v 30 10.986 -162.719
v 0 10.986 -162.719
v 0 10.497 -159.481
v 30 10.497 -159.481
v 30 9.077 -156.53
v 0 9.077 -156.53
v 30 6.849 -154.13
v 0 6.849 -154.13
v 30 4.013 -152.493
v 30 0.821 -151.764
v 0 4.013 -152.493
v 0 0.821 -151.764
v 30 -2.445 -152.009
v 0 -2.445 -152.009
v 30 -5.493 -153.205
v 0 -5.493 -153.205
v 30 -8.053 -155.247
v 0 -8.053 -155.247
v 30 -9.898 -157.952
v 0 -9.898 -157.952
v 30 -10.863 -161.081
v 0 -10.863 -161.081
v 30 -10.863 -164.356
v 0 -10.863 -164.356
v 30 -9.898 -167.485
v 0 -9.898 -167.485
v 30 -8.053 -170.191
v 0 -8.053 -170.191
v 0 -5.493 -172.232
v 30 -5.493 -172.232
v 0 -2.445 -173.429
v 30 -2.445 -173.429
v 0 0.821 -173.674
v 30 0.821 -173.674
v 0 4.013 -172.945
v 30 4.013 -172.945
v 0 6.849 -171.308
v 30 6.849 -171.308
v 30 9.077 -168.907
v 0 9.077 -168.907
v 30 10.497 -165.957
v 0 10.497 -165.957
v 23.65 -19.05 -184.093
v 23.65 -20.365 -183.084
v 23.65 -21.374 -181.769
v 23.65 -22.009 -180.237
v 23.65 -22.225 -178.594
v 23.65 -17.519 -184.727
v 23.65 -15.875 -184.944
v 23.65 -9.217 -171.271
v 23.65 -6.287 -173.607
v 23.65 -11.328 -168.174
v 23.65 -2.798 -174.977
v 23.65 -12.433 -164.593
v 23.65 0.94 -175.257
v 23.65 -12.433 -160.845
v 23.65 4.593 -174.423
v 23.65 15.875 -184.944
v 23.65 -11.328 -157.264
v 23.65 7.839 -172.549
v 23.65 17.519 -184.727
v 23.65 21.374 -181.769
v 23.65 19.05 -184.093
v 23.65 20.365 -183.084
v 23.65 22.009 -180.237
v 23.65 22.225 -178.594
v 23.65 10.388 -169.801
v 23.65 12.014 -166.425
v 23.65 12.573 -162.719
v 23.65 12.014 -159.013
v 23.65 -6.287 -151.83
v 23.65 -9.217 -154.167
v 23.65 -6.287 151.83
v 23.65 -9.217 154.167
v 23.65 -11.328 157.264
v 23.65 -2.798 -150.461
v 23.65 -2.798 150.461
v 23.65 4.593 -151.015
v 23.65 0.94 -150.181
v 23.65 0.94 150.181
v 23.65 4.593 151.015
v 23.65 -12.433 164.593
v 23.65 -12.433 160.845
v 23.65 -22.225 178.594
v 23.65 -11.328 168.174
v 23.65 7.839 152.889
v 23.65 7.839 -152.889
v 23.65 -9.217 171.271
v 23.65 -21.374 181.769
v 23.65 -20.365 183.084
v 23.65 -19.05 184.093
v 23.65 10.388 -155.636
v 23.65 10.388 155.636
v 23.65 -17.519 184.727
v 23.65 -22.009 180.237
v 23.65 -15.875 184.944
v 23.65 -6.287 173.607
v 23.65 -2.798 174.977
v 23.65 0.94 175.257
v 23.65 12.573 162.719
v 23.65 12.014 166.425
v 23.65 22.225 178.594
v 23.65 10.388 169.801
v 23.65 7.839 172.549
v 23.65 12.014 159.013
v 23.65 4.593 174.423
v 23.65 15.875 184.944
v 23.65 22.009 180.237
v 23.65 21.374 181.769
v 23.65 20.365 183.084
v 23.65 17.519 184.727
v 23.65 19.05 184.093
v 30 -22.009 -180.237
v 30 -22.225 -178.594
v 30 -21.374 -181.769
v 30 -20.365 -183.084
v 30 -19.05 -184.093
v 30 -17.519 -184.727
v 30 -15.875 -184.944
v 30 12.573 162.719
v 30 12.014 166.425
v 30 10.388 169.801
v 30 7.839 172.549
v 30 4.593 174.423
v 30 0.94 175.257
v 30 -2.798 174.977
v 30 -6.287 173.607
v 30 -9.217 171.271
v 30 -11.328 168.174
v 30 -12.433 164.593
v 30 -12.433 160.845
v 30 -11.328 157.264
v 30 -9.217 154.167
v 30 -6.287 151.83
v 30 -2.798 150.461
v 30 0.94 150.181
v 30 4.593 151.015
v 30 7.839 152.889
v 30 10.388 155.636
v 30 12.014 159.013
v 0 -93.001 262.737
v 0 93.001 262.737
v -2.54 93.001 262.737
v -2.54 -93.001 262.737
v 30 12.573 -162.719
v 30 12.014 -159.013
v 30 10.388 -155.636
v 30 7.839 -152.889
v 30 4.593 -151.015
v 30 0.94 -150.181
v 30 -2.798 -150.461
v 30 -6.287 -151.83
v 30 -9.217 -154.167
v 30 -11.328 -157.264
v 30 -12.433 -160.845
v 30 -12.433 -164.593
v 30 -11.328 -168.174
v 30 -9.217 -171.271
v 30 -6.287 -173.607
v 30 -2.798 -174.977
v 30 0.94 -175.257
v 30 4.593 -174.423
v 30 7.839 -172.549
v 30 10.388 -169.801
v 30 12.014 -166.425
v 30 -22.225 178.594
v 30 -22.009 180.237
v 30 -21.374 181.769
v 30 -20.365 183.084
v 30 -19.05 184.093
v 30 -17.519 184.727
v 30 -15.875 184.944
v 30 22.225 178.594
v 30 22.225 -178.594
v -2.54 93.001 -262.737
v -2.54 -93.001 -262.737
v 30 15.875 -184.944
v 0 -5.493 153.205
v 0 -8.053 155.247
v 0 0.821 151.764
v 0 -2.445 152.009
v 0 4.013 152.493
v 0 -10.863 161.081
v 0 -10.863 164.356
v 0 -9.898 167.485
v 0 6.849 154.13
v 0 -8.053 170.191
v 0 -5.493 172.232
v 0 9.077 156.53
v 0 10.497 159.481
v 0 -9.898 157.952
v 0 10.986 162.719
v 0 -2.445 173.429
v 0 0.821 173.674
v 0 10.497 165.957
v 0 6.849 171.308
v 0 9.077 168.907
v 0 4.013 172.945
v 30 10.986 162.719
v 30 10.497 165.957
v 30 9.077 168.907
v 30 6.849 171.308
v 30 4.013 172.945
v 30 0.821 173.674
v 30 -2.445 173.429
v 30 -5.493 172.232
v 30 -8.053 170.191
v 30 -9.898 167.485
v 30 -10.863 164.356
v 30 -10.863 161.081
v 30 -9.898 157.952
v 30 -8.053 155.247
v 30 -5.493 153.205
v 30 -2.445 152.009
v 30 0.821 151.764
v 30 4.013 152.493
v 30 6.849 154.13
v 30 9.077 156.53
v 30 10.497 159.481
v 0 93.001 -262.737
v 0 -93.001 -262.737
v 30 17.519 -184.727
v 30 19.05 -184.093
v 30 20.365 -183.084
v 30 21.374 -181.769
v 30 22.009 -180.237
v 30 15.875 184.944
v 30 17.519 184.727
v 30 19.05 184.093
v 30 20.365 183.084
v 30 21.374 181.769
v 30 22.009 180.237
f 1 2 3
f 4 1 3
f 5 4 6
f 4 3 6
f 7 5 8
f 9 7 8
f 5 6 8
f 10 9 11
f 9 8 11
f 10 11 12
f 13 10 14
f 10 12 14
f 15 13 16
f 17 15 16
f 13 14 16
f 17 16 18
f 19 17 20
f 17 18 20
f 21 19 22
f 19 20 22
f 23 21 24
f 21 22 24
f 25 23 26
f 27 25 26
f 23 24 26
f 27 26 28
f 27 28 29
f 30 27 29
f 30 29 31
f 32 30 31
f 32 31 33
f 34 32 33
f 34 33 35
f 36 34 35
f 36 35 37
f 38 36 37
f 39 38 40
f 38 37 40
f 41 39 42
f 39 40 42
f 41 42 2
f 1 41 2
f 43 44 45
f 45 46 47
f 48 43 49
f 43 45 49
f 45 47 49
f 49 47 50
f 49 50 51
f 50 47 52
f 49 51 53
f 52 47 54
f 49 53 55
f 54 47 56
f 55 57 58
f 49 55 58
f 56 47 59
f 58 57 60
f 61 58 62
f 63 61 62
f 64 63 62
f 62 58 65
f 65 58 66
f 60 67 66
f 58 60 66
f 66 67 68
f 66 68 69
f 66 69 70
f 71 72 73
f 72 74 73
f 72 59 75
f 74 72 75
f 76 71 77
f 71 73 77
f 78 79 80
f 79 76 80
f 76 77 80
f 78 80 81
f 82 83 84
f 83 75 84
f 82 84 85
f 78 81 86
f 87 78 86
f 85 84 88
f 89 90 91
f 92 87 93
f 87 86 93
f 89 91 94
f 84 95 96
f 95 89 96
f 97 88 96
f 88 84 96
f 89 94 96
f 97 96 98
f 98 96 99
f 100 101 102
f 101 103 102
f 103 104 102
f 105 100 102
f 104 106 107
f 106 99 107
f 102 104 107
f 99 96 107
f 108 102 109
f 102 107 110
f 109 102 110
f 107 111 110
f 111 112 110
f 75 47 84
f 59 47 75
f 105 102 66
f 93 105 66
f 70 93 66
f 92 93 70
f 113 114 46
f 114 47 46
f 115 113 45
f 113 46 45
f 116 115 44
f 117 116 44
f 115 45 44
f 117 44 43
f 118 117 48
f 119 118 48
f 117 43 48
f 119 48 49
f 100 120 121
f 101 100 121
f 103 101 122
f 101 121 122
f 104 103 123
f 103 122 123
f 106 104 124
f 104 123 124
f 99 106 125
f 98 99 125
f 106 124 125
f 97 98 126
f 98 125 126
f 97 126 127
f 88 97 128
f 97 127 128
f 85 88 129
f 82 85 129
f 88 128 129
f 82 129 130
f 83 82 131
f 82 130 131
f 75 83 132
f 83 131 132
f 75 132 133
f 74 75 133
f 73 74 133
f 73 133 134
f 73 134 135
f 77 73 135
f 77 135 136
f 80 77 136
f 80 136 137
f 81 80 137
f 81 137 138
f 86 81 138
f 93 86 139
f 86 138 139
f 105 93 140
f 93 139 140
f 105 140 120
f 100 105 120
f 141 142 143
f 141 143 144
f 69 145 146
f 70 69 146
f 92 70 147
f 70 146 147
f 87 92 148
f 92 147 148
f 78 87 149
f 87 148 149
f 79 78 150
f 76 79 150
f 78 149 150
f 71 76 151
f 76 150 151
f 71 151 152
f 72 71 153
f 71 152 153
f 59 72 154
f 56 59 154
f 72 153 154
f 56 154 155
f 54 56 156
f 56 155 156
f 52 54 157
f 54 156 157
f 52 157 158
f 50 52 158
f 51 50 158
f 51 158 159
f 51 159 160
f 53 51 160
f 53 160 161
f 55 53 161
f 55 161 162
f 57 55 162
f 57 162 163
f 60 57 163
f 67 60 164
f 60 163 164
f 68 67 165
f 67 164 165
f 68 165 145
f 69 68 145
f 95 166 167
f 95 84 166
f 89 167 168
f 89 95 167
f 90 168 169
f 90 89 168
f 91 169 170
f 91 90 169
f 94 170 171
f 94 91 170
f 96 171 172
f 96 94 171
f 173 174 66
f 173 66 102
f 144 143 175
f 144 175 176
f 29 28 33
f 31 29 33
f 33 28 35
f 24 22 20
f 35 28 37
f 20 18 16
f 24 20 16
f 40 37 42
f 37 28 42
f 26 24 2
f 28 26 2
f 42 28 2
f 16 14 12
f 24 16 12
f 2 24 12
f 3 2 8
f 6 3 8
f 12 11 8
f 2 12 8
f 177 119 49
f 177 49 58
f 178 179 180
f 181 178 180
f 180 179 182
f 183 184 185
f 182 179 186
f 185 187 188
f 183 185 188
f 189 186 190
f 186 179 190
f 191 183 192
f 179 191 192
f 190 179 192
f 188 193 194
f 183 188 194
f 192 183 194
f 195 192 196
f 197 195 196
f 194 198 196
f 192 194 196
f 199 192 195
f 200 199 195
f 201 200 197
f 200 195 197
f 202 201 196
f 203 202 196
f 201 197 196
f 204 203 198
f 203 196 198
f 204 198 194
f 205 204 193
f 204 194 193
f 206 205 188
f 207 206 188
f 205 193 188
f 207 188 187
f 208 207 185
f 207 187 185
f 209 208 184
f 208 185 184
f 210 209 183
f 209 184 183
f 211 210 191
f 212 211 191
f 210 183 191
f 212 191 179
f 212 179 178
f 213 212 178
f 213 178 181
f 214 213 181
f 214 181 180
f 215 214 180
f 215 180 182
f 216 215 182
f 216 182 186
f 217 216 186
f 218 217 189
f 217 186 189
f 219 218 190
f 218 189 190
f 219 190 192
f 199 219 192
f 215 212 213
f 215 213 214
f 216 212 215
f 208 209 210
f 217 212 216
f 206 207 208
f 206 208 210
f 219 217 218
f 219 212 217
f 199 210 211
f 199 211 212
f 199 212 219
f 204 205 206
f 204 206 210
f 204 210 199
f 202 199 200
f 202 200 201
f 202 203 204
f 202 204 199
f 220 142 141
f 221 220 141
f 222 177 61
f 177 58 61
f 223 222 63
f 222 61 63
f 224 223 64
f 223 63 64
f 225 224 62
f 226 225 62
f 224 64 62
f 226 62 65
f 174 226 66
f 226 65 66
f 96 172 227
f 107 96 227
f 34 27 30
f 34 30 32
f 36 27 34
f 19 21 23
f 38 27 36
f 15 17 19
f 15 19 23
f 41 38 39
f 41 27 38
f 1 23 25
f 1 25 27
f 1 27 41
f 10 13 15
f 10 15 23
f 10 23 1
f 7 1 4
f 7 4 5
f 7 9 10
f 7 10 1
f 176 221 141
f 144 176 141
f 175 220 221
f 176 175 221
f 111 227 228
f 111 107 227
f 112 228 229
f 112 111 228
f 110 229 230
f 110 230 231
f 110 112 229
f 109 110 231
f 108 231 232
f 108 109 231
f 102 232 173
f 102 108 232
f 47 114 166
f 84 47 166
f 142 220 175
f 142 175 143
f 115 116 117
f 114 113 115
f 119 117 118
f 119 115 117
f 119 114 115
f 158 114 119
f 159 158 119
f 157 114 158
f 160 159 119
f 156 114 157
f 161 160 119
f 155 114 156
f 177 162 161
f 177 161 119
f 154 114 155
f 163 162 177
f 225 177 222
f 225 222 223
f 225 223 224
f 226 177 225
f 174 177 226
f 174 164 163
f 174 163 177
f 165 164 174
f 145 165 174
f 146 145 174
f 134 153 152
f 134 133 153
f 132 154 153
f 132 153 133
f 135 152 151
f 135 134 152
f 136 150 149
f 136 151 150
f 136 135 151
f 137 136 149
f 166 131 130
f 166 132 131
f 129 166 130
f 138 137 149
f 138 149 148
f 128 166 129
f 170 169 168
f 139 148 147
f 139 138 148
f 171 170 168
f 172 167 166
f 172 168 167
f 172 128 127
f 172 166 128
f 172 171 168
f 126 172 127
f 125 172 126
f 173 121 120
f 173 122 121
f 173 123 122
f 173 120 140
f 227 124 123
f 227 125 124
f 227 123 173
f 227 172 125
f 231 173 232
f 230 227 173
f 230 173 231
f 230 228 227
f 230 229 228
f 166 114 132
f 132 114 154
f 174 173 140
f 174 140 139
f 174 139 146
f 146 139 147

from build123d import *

# Parameters (mm, degrees)
F0_R     = 10.9855
F1_DEPTH = 30
F2_W     = 186.002656
F2_H     = 525.473654
F3_DEPTH = 2.54
F4_W     = 44.45
F4_H     = 369.8875
F4_R     = 12.573
F5_DEPTH = 6.35
F6_R     = 6.35


with BuildPart() as f1:
    # F0 (on Right) → F1 (new body)
    with BuildSketch(Plane.YZ):
        with Locations((0, -162.71875)):
            Circle(F0_R)
        with Locations((0, 162.71875)):
            Circle(F0_R)
    extrude(amount=F1_DEPTH)


with BuildPart() as f3:
    # F2 (on face) → F3 (new body)
    with BuildSketch(Plane(origin=(0, 0, 0), x_dir=(0, -1, 0), z_dir=(-1, 0, 0))):
        Rectangle(F2_W, F2_H)
    extrude(amount=F3_DEPTH)


with BuildPart() as f5:
    # F4 (on face) → F5 (new body)
    with BuildSketch(Plane.YZ.offset(30)):
        Rectangle(F4_W, F4_H)
        with Locations((0, -162.71875)):
            Circle(F4_R, mode=Mode.SUBTRACT)
        with Locations((0, 162.71875)):
            Circle(F4_R, mode=Mode.SUBTRACT)
    extrude(amount=-F5_DEPTH)

    # F6
    f6_edges = [f5.edges().sort_by_distance(p)[0] for p in [
        (26.825, -22.225, 184.94375),
        (26.825, 22.225, 184.94375),
        (26.825, 22.225, -184.94375),
        (26.825, -22.225, -184.94375),
    ]]
    fillet(f6_edges, radius=F6_R)


solid = Compound([f1.part, f3.part, f5.part])
